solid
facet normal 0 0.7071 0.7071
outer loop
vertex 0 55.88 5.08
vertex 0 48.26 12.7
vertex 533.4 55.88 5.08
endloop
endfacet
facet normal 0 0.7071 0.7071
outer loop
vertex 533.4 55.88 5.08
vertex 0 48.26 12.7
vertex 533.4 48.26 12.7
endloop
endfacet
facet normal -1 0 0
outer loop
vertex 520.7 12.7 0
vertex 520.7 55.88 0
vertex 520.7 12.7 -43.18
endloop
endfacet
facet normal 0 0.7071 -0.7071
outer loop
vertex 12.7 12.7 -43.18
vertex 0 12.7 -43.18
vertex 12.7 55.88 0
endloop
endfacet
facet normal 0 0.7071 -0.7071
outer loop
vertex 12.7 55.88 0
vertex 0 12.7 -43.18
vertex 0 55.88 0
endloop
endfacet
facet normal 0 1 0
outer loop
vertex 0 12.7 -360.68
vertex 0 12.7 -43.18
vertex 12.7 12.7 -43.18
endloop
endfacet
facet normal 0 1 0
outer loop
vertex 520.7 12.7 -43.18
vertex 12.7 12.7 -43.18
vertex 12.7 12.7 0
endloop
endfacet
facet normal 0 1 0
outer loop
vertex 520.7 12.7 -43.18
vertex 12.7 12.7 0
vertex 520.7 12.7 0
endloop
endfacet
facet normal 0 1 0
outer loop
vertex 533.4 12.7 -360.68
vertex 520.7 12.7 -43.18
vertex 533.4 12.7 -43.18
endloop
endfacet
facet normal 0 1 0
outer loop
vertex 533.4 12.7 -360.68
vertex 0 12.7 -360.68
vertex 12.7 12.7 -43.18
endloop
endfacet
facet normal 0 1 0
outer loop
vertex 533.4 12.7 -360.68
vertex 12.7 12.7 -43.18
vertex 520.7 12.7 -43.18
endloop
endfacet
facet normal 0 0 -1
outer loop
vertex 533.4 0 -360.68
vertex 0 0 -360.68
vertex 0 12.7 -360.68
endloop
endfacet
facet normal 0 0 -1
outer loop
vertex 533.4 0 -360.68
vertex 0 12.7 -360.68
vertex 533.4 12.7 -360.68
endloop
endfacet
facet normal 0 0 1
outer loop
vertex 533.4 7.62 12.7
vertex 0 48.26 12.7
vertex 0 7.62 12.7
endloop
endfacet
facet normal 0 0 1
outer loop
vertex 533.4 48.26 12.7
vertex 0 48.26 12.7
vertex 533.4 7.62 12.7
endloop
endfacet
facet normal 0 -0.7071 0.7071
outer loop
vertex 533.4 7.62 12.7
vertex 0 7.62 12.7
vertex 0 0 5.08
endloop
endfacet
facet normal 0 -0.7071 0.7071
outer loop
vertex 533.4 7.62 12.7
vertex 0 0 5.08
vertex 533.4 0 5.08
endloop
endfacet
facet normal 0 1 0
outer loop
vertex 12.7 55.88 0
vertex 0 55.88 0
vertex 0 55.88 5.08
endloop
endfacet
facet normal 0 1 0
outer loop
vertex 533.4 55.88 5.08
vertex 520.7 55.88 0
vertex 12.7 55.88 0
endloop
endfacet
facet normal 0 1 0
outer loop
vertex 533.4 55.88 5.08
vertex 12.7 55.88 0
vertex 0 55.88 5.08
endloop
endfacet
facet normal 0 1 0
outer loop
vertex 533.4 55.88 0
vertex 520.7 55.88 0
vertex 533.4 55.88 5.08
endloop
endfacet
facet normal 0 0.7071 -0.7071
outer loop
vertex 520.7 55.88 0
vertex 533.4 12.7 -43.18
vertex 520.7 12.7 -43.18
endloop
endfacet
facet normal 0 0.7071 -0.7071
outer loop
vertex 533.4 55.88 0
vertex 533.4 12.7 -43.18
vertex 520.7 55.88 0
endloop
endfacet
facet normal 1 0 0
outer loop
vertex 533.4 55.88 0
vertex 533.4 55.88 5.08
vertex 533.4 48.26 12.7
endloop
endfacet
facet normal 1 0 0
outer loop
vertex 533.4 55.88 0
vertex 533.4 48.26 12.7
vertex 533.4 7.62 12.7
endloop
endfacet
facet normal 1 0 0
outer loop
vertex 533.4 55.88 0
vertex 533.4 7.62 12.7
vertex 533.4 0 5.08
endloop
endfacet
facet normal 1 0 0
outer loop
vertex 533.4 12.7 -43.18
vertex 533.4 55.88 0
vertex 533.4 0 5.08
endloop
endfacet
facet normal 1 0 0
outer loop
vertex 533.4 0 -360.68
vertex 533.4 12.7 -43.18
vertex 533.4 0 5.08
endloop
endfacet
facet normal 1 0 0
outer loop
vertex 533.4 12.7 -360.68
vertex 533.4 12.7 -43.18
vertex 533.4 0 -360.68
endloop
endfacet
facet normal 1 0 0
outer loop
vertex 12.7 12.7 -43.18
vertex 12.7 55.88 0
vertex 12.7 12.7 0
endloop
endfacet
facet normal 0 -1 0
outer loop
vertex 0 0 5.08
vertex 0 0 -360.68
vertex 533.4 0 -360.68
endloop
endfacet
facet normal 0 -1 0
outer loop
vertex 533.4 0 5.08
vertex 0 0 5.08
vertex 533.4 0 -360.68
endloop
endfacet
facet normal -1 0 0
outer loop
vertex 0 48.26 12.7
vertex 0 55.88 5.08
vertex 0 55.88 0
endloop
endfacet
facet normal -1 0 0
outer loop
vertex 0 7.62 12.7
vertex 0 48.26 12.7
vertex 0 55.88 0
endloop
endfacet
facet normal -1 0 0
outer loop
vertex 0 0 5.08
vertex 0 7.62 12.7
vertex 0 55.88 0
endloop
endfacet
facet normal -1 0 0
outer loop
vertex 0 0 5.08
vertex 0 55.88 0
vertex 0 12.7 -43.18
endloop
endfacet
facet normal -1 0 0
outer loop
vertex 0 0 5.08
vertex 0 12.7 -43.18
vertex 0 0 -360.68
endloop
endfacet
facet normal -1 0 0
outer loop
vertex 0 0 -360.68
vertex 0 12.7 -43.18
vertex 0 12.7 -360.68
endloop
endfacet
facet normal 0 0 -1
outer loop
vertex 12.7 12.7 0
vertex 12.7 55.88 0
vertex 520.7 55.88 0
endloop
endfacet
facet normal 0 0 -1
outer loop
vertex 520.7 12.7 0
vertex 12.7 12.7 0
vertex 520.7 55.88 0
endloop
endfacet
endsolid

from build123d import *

# Parameters (mm, degrees)
SKETCH_1_W      = 533.4
SKETCH_1_H      = 360.68
EXTRUDE_1_DEPTH = 12.7
SKETCH_2_W      = 533.4
SKETCH_2_H      = 55.88
EXTRUDE_2_DEPTH = 12.7
CHAMFER1_SIZE   = 7.62
EXTRUDE1_DEPTH  = 12.7
EXTRUDE3_DEPTH  = 12.7


with BuildPart() as part:
    # 草图1 → 凸台-拉伸1 (new body)
    with BuildSketch(Plane(origin=(0, 0, 0), x_dir=(1, 0, 0), z_dir=(0, 1, 0))):
        with Locations((266.7, 180.34)):
            Rectangle(SKETCH_1_W, SKETCH_1_H)
    extrude(amount=EXTRUDE_1_DEPTH)

    # 草图2 → 凸台-拉伸2 (add)
    with BuildSketch(Plane.XY):
        with Locations((266.7, 27.94)):
            Rectangle(SKETCH_2_W, SKETCH_2_H)
    extrude(amount=EXTRUDE_2_DEPTH)

    # Chamfer1
    chamfer1_edges = [part.edges().sort_by_distance(p)[0] for p in [
        (266.7, 0, 12.7),
        (266.7, 55.88, 12.7),
    ]]
    chamfer(chamfer1_edges, length=CHAMFER1_SIZE)

    # Sketch1 → Extrude1 (add)
    with BuildSketch(Plane(origin=(533.4, 0, 0), x_dir=(0, 0, -1), z_dir=(1, 0, 0))):
        Polygon((0, 55.88), (0, 12.7), (43.18, 12.7), align=None)
    extrude(amount=-EXTRUDE1_DEPTH)

    # Sketch4 → Extrude3 (add)
    with BuildSketch(Plane.ZY):
        Polygon((0, 55.88), (0, 12.7), (-43.18, 12.7), align=None)
    extrude(amount=-EXTRUDE3_DEPTH)


solid = part.part
